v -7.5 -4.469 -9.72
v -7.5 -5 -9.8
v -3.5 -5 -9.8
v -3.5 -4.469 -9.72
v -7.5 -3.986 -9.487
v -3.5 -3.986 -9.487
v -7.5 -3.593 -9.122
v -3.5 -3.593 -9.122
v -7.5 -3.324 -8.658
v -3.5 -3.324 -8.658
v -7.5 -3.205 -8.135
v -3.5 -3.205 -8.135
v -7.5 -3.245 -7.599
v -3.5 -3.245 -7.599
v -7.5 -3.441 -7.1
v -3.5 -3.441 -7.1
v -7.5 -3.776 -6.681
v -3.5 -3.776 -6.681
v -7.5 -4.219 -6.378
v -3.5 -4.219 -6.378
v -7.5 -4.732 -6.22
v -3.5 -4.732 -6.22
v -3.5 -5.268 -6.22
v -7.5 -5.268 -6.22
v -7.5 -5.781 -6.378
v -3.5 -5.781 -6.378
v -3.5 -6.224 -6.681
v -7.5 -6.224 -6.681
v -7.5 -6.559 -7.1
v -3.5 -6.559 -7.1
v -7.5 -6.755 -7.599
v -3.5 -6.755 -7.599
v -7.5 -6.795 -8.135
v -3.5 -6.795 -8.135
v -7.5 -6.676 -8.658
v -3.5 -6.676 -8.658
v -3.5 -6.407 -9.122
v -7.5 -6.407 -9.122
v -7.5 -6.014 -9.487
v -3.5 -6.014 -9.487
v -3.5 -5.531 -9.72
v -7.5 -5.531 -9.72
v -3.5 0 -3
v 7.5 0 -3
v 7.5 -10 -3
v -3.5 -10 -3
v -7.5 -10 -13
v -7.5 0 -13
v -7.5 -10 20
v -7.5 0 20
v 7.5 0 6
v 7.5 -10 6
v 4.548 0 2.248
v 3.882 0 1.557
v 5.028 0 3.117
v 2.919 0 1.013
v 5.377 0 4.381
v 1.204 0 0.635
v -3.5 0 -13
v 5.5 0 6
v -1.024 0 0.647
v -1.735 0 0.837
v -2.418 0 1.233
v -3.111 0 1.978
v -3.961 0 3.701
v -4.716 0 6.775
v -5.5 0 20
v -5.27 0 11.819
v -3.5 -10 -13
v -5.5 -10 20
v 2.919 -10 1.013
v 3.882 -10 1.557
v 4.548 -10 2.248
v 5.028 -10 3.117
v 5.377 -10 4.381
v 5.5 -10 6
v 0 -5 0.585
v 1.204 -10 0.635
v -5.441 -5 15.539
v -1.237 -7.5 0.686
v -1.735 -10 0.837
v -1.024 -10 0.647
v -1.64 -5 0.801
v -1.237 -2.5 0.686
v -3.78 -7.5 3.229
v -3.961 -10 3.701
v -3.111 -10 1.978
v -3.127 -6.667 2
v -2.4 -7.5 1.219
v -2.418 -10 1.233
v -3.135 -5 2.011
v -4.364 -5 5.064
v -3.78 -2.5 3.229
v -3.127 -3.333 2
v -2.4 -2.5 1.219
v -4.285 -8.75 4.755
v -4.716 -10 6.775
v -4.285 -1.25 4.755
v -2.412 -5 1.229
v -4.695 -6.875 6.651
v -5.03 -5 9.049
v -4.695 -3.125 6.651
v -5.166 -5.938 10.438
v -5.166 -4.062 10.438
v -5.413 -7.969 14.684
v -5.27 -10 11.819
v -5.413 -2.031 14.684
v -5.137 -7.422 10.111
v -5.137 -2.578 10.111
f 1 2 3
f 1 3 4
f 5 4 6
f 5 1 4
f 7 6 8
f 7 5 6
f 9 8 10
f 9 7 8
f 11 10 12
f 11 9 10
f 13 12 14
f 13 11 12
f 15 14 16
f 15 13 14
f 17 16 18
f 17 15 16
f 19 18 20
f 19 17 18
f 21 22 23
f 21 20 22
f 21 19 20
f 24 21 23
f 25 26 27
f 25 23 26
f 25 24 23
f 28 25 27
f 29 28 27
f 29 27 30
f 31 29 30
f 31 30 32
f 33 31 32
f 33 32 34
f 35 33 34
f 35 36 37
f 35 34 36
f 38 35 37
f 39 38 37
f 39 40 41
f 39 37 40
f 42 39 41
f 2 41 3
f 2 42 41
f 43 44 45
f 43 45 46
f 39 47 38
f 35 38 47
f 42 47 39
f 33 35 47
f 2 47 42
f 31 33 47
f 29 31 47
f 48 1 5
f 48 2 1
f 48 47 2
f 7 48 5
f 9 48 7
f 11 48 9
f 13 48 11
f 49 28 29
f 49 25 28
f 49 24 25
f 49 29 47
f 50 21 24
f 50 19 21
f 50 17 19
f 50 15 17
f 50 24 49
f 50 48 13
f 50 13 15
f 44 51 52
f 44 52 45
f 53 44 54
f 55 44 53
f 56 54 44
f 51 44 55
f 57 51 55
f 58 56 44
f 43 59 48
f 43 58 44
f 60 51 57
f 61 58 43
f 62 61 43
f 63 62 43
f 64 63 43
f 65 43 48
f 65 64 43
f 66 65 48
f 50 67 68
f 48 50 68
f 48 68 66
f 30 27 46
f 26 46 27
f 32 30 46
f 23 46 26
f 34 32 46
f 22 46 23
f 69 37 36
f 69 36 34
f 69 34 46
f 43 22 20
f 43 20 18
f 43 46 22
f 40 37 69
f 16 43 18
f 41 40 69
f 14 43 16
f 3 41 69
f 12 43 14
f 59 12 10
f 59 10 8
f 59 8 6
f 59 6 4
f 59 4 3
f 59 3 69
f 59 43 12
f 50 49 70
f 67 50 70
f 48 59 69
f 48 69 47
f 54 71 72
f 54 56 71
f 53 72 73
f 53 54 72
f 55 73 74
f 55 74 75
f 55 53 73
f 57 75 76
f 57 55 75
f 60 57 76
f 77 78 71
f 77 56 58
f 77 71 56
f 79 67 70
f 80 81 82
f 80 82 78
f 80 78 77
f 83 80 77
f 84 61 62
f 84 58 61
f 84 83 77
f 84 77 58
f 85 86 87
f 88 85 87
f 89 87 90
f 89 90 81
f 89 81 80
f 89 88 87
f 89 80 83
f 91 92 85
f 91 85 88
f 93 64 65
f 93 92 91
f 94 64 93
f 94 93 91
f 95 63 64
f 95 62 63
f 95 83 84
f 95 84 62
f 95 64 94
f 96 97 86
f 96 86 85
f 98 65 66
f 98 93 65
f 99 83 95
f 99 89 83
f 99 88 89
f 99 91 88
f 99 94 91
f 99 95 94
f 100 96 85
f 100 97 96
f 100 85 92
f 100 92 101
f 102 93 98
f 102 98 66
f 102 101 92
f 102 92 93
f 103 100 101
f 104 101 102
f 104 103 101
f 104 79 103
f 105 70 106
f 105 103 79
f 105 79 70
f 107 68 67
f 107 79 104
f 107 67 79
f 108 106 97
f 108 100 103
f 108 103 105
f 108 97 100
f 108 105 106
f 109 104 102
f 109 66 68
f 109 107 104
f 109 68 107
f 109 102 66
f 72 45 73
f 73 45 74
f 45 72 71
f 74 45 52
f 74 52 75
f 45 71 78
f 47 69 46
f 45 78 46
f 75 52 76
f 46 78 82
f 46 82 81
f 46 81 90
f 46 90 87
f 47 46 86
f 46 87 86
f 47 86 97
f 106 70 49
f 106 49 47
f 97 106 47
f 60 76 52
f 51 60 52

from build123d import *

# Parameters (mm, degrees)
CYLINDER_R     = 1.8
CYLINDER_DEPTH = 40
PAD_DEPTH      = 10


with BuildPart() as hole:
    # Cylinder → Cylinder (new body)
    with BuildSketch(Plane(origin=(-25, -5, -8), x_dir=(0, 0, -1), z_dir=(1, 0, 0))):
        Circle(CYLINDER_R)
    extrude(amount=CYLINDER_DEPTH)


with BuildPart() as cut:
    # Sketch → Pad (new body)
    with BuildSketch(Plane.XZ):
        with BuildLine():
            Line((-7.5, -13), (-7.5, 20))
            Line((-7.5, 20), (-5.5, 20))
            add(Edge.make_bspline(
                [(-5.5, 20), (-5.5, 1.17), (0, 0), (5.5, 1.17), (5.5, 6)],
                knots=[0, 0, 0, 0, 0.5, 1, 1, 1, 1], degree=3))
            Line((5.5, 6), (7.5, 6))
            Line((7.5, 6), (7.5, -3))
            Line((7.5, -3), (-3.5, -3))
            Line((-3.5, -3), (-3.5, -13))
            Line((-3.5, -13), (-7.5, -13))
        make_face()
    extrude(amount=PAD_DEPTH)

    # Cut: cut hole
    add(hole.part, mode=Mode.SUBTRACT)


solid = cut.part
